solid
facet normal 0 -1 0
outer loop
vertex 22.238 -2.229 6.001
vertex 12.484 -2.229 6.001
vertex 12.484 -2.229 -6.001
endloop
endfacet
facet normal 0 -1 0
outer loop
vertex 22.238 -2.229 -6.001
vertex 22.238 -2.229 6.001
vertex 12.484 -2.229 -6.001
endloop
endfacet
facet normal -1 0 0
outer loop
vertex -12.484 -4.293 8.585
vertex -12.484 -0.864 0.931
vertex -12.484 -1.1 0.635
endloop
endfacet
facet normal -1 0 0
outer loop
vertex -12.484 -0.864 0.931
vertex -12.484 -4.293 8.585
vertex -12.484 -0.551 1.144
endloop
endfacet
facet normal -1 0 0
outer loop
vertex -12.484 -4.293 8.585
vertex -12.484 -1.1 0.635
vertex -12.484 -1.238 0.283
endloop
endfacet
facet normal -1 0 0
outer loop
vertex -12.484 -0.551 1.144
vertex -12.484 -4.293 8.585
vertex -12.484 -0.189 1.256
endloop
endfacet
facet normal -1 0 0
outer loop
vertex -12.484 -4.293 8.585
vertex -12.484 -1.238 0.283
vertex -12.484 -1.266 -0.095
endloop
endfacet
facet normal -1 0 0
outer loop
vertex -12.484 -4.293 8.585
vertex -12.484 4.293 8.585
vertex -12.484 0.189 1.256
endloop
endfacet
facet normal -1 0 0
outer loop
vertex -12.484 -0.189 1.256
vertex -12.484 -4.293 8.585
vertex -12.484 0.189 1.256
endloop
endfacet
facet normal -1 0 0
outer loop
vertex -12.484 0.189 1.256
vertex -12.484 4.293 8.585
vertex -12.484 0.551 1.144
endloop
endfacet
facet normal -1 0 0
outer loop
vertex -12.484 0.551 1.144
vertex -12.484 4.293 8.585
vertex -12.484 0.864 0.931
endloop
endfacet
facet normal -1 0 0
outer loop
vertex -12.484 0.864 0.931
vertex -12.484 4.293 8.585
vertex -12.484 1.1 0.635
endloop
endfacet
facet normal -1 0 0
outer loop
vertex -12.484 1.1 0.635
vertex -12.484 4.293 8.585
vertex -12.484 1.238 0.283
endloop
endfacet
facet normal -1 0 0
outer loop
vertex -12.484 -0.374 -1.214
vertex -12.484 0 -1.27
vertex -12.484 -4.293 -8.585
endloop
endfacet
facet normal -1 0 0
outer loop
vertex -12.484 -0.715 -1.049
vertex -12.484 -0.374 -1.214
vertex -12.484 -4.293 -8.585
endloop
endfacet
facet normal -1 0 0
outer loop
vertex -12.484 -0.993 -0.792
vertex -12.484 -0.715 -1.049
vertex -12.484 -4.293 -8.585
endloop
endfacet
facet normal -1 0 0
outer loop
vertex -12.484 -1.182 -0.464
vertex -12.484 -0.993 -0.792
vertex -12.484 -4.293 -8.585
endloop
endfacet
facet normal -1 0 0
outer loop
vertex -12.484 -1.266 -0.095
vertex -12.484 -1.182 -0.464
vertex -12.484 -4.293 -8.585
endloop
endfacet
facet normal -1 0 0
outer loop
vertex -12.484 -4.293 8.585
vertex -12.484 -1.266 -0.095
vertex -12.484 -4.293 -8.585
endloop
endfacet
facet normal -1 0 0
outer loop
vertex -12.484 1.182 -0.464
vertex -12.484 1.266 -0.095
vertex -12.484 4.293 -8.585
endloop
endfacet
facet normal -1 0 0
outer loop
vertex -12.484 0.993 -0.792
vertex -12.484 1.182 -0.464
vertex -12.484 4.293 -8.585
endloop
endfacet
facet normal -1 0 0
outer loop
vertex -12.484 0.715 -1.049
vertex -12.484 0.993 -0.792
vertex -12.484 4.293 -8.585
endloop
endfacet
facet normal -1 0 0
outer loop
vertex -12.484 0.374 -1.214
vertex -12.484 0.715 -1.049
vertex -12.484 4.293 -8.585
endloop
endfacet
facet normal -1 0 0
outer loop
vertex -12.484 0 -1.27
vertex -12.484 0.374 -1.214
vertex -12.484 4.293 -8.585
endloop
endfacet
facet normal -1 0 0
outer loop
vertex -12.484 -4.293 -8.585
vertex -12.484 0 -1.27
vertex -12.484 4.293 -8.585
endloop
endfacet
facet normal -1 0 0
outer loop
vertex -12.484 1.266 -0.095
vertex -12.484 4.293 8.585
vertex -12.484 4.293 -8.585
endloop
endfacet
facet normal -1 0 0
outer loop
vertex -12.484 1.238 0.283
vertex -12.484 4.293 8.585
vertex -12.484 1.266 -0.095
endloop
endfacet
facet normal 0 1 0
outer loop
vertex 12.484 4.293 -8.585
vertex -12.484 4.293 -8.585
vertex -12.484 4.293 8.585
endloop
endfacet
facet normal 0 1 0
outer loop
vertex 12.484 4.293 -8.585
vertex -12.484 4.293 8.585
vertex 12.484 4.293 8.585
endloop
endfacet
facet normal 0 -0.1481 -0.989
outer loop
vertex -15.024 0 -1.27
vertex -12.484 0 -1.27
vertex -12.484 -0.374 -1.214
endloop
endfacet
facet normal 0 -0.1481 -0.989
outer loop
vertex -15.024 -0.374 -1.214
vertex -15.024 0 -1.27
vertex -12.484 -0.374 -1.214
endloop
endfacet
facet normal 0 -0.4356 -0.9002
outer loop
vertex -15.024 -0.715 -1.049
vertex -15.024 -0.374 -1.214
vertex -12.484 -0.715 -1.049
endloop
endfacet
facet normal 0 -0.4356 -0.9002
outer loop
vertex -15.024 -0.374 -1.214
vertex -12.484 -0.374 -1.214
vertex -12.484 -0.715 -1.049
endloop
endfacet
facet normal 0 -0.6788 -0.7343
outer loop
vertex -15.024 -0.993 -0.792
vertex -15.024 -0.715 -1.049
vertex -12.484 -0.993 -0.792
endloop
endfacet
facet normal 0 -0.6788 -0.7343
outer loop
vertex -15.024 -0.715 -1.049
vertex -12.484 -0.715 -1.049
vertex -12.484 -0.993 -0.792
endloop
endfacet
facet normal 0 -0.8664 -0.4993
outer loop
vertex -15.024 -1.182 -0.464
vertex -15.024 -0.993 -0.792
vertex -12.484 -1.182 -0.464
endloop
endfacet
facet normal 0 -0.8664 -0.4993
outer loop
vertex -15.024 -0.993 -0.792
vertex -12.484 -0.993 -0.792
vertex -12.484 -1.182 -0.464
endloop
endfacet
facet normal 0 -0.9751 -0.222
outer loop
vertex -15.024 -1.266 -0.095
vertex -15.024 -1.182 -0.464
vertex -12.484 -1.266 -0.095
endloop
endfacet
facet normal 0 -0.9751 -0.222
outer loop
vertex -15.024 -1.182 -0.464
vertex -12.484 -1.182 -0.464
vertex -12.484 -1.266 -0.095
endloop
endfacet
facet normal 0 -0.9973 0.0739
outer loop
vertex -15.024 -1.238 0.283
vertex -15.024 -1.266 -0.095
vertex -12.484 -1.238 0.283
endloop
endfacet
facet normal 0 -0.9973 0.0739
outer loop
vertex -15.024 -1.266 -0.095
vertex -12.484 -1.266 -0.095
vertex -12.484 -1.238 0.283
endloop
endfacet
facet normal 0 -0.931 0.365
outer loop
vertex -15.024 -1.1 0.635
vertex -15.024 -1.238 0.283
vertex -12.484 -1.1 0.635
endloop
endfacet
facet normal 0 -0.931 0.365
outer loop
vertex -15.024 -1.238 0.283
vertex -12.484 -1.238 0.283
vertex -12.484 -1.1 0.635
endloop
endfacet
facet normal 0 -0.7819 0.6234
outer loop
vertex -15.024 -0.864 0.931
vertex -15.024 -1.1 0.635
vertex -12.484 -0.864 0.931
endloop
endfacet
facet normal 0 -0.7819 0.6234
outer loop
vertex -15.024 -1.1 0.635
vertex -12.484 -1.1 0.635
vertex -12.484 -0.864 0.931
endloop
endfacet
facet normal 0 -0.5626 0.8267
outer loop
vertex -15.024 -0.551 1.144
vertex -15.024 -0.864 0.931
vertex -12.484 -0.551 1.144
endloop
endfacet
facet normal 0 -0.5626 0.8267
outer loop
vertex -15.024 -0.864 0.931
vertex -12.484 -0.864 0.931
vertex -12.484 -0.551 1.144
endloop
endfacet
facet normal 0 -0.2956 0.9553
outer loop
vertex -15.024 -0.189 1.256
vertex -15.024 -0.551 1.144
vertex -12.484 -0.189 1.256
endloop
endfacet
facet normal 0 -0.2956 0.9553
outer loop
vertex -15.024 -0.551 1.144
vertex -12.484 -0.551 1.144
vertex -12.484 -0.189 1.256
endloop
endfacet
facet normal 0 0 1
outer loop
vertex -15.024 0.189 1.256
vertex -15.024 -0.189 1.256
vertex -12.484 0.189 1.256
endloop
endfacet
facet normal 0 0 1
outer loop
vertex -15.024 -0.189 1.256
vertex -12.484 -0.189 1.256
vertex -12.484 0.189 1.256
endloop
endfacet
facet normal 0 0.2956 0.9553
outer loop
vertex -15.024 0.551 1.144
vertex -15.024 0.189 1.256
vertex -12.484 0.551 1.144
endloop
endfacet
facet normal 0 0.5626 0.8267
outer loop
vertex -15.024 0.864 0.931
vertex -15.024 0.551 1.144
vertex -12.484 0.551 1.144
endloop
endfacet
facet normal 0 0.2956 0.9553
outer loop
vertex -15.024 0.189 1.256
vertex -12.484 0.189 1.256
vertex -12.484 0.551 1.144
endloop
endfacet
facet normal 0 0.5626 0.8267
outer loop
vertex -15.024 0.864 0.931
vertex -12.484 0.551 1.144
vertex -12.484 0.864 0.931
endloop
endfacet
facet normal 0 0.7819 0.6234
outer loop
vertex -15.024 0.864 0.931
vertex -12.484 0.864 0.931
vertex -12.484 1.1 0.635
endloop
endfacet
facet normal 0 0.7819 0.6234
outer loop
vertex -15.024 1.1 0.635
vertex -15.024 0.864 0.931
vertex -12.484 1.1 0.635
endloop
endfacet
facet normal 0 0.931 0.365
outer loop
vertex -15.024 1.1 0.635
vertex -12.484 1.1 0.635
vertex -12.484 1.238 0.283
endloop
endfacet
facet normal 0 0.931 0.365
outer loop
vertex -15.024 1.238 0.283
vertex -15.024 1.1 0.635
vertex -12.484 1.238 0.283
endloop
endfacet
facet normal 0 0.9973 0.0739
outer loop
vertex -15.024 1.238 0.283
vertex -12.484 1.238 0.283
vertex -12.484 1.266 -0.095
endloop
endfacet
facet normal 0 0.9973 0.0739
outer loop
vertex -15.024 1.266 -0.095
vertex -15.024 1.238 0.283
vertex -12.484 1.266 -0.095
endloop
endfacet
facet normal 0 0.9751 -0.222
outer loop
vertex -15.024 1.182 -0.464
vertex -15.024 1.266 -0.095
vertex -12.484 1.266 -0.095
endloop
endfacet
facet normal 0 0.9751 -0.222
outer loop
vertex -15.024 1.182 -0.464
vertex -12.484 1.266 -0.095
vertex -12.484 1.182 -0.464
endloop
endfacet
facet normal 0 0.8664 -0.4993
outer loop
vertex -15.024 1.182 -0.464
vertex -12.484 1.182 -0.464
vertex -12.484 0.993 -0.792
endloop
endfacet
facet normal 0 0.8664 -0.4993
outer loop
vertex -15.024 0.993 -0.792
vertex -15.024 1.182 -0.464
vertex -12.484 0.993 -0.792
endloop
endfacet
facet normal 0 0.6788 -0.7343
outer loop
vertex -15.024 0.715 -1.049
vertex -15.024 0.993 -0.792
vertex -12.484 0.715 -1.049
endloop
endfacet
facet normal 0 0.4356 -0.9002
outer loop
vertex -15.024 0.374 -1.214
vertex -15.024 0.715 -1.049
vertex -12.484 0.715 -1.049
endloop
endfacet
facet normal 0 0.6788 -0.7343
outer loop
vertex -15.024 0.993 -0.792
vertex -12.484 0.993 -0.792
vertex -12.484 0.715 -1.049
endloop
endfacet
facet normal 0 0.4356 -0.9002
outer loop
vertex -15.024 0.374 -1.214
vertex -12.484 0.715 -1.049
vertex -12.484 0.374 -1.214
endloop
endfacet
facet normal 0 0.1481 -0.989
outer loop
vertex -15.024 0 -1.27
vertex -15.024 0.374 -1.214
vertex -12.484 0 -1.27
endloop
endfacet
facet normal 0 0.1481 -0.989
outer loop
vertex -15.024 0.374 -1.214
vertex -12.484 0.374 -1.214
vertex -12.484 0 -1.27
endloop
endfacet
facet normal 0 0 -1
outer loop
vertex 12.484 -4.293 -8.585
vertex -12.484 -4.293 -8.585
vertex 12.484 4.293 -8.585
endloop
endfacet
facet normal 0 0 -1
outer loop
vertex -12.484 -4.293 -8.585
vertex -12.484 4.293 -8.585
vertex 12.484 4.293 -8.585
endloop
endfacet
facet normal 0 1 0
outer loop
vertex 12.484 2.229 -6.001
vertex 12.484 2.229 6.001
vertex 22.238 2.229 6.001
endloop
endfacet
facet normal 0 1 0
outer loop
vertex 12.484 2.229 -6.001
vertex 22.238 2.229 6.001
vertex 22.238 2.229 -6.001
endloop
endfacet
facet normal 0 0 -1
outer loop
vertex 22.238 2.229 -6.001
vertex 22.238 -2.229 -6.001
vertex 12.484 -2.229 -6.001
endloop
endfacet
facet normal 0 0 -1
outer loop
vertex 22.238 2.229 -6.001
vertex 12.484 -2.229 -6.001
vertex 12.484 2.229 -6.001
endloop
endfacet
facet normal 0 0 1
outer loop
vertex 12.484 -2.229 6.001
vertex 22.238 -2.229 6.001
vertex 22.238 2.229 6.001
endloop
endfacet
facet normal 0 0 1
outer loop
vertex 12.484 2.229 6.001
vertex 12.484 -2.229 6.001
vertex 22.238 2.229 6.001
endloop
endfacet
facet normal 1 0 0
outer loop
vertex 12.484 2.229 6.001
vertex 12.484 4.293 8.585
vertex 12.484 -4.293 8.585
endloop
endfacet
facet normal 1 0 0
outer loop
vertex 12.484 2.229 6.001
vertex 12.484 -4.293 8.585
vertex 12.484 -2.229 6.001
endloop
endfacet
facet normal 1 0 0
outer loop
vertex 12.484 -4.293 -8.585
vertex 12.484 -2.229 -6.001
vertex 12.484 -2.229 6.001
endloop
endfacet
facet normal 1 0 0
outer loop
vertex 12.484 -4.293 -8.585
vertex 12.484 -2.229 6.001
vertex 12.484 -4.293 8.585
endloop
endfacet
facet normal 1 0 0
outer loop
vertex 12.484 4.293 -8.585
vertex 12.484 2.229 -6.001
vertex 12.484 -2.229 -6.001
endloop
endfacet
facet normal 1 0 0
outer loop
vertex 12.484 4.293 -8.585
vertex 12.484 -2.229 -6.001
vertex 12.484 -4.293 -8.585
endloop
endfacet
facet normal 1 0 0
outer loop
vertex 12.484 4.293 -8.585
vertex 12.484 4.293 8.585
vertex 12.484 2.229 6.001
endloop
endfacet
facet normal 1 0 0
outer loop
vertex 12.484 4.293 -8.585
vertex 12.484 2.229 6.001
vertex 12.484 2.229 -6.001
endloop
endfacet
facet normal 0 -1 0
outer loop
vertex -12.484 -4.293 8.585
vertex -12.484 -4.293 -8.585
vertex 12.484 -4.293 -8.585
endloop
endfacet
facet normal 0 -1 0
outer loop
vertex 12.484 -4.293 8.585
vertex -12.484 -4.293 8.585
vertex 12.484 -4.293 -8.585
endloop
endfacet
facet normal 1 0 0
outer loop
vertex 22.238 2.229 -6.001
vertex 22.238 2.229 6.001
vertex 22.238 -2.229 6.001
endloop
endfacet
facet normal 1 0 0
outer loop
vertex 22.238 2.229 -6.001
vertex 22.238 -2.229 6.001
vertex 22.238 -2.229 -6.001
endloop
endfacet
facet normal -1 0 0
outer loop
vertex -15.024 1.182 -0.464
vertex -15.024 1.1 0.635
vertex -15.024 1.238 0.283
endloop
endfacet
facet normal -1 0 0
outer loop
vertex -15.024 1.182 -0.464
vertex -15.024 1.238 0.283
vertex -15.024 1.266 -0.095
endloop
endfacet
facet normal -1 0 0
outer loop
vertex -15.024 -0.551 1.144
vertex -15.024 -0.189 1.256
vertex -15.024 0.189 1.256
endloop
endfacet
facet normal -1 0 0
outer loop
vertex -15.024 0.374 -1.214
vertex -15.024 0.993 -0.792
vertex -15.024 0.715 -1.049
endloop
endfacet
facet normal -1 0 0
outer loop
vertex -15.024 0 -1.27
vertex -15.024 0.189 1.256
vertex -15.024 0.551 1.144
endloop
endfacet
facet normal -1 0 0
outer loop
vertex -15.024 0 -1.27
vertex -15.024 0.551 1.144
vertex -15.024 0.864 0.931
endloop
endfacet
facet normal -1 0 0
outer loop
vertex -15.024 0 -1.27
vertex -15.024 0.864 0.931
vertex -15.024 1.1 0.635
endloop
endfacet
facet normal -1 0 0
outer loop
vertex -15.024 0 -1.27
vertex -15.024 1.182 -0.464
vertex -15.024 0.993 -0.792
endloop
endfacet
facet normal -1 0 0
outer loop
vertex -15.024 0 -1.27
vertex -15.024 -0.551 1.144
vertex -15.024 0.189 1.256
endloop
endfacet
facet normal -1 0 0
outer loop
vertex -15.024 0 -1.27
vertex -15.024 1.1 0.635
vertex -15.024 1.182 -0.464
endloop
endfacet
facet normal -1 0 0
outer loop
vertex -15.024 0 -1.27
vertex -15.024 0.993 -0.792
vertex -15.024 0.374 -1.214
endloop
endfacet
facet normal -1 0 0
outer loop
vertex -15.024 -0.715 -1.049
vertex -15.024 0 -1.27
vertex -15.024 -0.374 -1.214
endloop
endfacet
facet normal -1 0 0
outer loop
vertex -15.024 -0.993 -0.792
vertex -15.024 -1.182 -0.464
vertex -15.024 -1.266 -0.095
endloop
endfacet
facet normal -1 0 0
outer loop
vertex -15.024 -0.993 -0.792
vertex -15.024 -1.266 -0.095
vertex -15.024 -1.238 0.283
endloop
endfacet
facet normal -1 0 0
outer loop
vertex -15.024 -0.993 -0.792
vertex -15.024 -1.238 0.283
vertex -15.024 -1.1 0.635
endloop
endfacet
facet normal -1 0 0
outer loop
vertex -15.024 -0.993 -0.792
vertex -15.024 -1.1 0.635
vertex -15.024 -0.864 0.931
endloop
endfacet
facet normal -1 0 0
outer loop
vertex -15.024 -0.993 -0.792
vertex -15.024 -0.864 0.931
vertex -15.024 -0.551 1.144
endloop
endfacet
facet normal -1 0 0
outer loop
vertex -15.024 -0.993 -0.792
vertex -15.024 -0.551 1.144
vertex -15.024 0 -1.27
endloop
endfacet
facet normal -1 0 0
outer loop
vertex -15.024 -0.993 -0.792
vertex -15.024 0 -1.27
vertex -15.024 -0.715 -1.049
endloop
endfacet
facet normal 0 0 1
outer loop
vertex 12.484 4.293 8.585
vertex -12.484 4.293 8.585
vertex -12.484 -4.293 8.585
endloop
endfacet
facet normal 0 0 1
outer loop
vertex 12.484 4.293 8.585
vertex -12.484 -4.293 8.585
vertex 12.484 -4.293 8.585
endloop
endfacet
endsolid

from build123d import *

# Parameters (mm, degrees)
SKETCH1_W           = 24.9682
SKETCH1_H           = 17.1704
BOSS_EXTRUDE1_DEPTH = 4.2926
SKETCH3_W           = 12.0015
SKETCH3_H           = 4.4577
BOSS_EXTRUDE2_DEPTH = 9.7536
SKETCH4_R           = 1.27
BOSS_EXTRUDE3_DEPTH = 2.54


with BuildPart() as part:
    # Sketch1 → Boss-Extrude1 (new, symmetric)
    with BuildSketch(Plane(origin=(0, 0, 0), x_dir=(1, 0, 0), z_dir=(0, 1, 0))):
        Rectangle(SKETCH1_W, SKETCH1_H)
    extrude(amount=BOSS_EXTRUDE1_DEPTH, both=True)

    # Sketch3 → Boss-Extrude2 (add)
    with BuildSketch(Plane(origin=(12.4841, 0, 0), x_dir=(0, 0, -1), z_dir=(1, 0, 0))):
        Rectangle(SKETCH3_W, SKETCH3_H)
    extrude(amount=BOSS_EXTRUDE2_DEPTH)

    # Sketch4 → Boss-Extrude3 (add)
    with BuildSketch(Plane.ZY.offset(12.4841)):
        with Locations(Location((0, 0, 0), (0, 0, 180))):
            Circle(SKETCH4_R)
    extrude(amount=BOSS_EXTRUDE3_DEPTH)


solid = part.part
